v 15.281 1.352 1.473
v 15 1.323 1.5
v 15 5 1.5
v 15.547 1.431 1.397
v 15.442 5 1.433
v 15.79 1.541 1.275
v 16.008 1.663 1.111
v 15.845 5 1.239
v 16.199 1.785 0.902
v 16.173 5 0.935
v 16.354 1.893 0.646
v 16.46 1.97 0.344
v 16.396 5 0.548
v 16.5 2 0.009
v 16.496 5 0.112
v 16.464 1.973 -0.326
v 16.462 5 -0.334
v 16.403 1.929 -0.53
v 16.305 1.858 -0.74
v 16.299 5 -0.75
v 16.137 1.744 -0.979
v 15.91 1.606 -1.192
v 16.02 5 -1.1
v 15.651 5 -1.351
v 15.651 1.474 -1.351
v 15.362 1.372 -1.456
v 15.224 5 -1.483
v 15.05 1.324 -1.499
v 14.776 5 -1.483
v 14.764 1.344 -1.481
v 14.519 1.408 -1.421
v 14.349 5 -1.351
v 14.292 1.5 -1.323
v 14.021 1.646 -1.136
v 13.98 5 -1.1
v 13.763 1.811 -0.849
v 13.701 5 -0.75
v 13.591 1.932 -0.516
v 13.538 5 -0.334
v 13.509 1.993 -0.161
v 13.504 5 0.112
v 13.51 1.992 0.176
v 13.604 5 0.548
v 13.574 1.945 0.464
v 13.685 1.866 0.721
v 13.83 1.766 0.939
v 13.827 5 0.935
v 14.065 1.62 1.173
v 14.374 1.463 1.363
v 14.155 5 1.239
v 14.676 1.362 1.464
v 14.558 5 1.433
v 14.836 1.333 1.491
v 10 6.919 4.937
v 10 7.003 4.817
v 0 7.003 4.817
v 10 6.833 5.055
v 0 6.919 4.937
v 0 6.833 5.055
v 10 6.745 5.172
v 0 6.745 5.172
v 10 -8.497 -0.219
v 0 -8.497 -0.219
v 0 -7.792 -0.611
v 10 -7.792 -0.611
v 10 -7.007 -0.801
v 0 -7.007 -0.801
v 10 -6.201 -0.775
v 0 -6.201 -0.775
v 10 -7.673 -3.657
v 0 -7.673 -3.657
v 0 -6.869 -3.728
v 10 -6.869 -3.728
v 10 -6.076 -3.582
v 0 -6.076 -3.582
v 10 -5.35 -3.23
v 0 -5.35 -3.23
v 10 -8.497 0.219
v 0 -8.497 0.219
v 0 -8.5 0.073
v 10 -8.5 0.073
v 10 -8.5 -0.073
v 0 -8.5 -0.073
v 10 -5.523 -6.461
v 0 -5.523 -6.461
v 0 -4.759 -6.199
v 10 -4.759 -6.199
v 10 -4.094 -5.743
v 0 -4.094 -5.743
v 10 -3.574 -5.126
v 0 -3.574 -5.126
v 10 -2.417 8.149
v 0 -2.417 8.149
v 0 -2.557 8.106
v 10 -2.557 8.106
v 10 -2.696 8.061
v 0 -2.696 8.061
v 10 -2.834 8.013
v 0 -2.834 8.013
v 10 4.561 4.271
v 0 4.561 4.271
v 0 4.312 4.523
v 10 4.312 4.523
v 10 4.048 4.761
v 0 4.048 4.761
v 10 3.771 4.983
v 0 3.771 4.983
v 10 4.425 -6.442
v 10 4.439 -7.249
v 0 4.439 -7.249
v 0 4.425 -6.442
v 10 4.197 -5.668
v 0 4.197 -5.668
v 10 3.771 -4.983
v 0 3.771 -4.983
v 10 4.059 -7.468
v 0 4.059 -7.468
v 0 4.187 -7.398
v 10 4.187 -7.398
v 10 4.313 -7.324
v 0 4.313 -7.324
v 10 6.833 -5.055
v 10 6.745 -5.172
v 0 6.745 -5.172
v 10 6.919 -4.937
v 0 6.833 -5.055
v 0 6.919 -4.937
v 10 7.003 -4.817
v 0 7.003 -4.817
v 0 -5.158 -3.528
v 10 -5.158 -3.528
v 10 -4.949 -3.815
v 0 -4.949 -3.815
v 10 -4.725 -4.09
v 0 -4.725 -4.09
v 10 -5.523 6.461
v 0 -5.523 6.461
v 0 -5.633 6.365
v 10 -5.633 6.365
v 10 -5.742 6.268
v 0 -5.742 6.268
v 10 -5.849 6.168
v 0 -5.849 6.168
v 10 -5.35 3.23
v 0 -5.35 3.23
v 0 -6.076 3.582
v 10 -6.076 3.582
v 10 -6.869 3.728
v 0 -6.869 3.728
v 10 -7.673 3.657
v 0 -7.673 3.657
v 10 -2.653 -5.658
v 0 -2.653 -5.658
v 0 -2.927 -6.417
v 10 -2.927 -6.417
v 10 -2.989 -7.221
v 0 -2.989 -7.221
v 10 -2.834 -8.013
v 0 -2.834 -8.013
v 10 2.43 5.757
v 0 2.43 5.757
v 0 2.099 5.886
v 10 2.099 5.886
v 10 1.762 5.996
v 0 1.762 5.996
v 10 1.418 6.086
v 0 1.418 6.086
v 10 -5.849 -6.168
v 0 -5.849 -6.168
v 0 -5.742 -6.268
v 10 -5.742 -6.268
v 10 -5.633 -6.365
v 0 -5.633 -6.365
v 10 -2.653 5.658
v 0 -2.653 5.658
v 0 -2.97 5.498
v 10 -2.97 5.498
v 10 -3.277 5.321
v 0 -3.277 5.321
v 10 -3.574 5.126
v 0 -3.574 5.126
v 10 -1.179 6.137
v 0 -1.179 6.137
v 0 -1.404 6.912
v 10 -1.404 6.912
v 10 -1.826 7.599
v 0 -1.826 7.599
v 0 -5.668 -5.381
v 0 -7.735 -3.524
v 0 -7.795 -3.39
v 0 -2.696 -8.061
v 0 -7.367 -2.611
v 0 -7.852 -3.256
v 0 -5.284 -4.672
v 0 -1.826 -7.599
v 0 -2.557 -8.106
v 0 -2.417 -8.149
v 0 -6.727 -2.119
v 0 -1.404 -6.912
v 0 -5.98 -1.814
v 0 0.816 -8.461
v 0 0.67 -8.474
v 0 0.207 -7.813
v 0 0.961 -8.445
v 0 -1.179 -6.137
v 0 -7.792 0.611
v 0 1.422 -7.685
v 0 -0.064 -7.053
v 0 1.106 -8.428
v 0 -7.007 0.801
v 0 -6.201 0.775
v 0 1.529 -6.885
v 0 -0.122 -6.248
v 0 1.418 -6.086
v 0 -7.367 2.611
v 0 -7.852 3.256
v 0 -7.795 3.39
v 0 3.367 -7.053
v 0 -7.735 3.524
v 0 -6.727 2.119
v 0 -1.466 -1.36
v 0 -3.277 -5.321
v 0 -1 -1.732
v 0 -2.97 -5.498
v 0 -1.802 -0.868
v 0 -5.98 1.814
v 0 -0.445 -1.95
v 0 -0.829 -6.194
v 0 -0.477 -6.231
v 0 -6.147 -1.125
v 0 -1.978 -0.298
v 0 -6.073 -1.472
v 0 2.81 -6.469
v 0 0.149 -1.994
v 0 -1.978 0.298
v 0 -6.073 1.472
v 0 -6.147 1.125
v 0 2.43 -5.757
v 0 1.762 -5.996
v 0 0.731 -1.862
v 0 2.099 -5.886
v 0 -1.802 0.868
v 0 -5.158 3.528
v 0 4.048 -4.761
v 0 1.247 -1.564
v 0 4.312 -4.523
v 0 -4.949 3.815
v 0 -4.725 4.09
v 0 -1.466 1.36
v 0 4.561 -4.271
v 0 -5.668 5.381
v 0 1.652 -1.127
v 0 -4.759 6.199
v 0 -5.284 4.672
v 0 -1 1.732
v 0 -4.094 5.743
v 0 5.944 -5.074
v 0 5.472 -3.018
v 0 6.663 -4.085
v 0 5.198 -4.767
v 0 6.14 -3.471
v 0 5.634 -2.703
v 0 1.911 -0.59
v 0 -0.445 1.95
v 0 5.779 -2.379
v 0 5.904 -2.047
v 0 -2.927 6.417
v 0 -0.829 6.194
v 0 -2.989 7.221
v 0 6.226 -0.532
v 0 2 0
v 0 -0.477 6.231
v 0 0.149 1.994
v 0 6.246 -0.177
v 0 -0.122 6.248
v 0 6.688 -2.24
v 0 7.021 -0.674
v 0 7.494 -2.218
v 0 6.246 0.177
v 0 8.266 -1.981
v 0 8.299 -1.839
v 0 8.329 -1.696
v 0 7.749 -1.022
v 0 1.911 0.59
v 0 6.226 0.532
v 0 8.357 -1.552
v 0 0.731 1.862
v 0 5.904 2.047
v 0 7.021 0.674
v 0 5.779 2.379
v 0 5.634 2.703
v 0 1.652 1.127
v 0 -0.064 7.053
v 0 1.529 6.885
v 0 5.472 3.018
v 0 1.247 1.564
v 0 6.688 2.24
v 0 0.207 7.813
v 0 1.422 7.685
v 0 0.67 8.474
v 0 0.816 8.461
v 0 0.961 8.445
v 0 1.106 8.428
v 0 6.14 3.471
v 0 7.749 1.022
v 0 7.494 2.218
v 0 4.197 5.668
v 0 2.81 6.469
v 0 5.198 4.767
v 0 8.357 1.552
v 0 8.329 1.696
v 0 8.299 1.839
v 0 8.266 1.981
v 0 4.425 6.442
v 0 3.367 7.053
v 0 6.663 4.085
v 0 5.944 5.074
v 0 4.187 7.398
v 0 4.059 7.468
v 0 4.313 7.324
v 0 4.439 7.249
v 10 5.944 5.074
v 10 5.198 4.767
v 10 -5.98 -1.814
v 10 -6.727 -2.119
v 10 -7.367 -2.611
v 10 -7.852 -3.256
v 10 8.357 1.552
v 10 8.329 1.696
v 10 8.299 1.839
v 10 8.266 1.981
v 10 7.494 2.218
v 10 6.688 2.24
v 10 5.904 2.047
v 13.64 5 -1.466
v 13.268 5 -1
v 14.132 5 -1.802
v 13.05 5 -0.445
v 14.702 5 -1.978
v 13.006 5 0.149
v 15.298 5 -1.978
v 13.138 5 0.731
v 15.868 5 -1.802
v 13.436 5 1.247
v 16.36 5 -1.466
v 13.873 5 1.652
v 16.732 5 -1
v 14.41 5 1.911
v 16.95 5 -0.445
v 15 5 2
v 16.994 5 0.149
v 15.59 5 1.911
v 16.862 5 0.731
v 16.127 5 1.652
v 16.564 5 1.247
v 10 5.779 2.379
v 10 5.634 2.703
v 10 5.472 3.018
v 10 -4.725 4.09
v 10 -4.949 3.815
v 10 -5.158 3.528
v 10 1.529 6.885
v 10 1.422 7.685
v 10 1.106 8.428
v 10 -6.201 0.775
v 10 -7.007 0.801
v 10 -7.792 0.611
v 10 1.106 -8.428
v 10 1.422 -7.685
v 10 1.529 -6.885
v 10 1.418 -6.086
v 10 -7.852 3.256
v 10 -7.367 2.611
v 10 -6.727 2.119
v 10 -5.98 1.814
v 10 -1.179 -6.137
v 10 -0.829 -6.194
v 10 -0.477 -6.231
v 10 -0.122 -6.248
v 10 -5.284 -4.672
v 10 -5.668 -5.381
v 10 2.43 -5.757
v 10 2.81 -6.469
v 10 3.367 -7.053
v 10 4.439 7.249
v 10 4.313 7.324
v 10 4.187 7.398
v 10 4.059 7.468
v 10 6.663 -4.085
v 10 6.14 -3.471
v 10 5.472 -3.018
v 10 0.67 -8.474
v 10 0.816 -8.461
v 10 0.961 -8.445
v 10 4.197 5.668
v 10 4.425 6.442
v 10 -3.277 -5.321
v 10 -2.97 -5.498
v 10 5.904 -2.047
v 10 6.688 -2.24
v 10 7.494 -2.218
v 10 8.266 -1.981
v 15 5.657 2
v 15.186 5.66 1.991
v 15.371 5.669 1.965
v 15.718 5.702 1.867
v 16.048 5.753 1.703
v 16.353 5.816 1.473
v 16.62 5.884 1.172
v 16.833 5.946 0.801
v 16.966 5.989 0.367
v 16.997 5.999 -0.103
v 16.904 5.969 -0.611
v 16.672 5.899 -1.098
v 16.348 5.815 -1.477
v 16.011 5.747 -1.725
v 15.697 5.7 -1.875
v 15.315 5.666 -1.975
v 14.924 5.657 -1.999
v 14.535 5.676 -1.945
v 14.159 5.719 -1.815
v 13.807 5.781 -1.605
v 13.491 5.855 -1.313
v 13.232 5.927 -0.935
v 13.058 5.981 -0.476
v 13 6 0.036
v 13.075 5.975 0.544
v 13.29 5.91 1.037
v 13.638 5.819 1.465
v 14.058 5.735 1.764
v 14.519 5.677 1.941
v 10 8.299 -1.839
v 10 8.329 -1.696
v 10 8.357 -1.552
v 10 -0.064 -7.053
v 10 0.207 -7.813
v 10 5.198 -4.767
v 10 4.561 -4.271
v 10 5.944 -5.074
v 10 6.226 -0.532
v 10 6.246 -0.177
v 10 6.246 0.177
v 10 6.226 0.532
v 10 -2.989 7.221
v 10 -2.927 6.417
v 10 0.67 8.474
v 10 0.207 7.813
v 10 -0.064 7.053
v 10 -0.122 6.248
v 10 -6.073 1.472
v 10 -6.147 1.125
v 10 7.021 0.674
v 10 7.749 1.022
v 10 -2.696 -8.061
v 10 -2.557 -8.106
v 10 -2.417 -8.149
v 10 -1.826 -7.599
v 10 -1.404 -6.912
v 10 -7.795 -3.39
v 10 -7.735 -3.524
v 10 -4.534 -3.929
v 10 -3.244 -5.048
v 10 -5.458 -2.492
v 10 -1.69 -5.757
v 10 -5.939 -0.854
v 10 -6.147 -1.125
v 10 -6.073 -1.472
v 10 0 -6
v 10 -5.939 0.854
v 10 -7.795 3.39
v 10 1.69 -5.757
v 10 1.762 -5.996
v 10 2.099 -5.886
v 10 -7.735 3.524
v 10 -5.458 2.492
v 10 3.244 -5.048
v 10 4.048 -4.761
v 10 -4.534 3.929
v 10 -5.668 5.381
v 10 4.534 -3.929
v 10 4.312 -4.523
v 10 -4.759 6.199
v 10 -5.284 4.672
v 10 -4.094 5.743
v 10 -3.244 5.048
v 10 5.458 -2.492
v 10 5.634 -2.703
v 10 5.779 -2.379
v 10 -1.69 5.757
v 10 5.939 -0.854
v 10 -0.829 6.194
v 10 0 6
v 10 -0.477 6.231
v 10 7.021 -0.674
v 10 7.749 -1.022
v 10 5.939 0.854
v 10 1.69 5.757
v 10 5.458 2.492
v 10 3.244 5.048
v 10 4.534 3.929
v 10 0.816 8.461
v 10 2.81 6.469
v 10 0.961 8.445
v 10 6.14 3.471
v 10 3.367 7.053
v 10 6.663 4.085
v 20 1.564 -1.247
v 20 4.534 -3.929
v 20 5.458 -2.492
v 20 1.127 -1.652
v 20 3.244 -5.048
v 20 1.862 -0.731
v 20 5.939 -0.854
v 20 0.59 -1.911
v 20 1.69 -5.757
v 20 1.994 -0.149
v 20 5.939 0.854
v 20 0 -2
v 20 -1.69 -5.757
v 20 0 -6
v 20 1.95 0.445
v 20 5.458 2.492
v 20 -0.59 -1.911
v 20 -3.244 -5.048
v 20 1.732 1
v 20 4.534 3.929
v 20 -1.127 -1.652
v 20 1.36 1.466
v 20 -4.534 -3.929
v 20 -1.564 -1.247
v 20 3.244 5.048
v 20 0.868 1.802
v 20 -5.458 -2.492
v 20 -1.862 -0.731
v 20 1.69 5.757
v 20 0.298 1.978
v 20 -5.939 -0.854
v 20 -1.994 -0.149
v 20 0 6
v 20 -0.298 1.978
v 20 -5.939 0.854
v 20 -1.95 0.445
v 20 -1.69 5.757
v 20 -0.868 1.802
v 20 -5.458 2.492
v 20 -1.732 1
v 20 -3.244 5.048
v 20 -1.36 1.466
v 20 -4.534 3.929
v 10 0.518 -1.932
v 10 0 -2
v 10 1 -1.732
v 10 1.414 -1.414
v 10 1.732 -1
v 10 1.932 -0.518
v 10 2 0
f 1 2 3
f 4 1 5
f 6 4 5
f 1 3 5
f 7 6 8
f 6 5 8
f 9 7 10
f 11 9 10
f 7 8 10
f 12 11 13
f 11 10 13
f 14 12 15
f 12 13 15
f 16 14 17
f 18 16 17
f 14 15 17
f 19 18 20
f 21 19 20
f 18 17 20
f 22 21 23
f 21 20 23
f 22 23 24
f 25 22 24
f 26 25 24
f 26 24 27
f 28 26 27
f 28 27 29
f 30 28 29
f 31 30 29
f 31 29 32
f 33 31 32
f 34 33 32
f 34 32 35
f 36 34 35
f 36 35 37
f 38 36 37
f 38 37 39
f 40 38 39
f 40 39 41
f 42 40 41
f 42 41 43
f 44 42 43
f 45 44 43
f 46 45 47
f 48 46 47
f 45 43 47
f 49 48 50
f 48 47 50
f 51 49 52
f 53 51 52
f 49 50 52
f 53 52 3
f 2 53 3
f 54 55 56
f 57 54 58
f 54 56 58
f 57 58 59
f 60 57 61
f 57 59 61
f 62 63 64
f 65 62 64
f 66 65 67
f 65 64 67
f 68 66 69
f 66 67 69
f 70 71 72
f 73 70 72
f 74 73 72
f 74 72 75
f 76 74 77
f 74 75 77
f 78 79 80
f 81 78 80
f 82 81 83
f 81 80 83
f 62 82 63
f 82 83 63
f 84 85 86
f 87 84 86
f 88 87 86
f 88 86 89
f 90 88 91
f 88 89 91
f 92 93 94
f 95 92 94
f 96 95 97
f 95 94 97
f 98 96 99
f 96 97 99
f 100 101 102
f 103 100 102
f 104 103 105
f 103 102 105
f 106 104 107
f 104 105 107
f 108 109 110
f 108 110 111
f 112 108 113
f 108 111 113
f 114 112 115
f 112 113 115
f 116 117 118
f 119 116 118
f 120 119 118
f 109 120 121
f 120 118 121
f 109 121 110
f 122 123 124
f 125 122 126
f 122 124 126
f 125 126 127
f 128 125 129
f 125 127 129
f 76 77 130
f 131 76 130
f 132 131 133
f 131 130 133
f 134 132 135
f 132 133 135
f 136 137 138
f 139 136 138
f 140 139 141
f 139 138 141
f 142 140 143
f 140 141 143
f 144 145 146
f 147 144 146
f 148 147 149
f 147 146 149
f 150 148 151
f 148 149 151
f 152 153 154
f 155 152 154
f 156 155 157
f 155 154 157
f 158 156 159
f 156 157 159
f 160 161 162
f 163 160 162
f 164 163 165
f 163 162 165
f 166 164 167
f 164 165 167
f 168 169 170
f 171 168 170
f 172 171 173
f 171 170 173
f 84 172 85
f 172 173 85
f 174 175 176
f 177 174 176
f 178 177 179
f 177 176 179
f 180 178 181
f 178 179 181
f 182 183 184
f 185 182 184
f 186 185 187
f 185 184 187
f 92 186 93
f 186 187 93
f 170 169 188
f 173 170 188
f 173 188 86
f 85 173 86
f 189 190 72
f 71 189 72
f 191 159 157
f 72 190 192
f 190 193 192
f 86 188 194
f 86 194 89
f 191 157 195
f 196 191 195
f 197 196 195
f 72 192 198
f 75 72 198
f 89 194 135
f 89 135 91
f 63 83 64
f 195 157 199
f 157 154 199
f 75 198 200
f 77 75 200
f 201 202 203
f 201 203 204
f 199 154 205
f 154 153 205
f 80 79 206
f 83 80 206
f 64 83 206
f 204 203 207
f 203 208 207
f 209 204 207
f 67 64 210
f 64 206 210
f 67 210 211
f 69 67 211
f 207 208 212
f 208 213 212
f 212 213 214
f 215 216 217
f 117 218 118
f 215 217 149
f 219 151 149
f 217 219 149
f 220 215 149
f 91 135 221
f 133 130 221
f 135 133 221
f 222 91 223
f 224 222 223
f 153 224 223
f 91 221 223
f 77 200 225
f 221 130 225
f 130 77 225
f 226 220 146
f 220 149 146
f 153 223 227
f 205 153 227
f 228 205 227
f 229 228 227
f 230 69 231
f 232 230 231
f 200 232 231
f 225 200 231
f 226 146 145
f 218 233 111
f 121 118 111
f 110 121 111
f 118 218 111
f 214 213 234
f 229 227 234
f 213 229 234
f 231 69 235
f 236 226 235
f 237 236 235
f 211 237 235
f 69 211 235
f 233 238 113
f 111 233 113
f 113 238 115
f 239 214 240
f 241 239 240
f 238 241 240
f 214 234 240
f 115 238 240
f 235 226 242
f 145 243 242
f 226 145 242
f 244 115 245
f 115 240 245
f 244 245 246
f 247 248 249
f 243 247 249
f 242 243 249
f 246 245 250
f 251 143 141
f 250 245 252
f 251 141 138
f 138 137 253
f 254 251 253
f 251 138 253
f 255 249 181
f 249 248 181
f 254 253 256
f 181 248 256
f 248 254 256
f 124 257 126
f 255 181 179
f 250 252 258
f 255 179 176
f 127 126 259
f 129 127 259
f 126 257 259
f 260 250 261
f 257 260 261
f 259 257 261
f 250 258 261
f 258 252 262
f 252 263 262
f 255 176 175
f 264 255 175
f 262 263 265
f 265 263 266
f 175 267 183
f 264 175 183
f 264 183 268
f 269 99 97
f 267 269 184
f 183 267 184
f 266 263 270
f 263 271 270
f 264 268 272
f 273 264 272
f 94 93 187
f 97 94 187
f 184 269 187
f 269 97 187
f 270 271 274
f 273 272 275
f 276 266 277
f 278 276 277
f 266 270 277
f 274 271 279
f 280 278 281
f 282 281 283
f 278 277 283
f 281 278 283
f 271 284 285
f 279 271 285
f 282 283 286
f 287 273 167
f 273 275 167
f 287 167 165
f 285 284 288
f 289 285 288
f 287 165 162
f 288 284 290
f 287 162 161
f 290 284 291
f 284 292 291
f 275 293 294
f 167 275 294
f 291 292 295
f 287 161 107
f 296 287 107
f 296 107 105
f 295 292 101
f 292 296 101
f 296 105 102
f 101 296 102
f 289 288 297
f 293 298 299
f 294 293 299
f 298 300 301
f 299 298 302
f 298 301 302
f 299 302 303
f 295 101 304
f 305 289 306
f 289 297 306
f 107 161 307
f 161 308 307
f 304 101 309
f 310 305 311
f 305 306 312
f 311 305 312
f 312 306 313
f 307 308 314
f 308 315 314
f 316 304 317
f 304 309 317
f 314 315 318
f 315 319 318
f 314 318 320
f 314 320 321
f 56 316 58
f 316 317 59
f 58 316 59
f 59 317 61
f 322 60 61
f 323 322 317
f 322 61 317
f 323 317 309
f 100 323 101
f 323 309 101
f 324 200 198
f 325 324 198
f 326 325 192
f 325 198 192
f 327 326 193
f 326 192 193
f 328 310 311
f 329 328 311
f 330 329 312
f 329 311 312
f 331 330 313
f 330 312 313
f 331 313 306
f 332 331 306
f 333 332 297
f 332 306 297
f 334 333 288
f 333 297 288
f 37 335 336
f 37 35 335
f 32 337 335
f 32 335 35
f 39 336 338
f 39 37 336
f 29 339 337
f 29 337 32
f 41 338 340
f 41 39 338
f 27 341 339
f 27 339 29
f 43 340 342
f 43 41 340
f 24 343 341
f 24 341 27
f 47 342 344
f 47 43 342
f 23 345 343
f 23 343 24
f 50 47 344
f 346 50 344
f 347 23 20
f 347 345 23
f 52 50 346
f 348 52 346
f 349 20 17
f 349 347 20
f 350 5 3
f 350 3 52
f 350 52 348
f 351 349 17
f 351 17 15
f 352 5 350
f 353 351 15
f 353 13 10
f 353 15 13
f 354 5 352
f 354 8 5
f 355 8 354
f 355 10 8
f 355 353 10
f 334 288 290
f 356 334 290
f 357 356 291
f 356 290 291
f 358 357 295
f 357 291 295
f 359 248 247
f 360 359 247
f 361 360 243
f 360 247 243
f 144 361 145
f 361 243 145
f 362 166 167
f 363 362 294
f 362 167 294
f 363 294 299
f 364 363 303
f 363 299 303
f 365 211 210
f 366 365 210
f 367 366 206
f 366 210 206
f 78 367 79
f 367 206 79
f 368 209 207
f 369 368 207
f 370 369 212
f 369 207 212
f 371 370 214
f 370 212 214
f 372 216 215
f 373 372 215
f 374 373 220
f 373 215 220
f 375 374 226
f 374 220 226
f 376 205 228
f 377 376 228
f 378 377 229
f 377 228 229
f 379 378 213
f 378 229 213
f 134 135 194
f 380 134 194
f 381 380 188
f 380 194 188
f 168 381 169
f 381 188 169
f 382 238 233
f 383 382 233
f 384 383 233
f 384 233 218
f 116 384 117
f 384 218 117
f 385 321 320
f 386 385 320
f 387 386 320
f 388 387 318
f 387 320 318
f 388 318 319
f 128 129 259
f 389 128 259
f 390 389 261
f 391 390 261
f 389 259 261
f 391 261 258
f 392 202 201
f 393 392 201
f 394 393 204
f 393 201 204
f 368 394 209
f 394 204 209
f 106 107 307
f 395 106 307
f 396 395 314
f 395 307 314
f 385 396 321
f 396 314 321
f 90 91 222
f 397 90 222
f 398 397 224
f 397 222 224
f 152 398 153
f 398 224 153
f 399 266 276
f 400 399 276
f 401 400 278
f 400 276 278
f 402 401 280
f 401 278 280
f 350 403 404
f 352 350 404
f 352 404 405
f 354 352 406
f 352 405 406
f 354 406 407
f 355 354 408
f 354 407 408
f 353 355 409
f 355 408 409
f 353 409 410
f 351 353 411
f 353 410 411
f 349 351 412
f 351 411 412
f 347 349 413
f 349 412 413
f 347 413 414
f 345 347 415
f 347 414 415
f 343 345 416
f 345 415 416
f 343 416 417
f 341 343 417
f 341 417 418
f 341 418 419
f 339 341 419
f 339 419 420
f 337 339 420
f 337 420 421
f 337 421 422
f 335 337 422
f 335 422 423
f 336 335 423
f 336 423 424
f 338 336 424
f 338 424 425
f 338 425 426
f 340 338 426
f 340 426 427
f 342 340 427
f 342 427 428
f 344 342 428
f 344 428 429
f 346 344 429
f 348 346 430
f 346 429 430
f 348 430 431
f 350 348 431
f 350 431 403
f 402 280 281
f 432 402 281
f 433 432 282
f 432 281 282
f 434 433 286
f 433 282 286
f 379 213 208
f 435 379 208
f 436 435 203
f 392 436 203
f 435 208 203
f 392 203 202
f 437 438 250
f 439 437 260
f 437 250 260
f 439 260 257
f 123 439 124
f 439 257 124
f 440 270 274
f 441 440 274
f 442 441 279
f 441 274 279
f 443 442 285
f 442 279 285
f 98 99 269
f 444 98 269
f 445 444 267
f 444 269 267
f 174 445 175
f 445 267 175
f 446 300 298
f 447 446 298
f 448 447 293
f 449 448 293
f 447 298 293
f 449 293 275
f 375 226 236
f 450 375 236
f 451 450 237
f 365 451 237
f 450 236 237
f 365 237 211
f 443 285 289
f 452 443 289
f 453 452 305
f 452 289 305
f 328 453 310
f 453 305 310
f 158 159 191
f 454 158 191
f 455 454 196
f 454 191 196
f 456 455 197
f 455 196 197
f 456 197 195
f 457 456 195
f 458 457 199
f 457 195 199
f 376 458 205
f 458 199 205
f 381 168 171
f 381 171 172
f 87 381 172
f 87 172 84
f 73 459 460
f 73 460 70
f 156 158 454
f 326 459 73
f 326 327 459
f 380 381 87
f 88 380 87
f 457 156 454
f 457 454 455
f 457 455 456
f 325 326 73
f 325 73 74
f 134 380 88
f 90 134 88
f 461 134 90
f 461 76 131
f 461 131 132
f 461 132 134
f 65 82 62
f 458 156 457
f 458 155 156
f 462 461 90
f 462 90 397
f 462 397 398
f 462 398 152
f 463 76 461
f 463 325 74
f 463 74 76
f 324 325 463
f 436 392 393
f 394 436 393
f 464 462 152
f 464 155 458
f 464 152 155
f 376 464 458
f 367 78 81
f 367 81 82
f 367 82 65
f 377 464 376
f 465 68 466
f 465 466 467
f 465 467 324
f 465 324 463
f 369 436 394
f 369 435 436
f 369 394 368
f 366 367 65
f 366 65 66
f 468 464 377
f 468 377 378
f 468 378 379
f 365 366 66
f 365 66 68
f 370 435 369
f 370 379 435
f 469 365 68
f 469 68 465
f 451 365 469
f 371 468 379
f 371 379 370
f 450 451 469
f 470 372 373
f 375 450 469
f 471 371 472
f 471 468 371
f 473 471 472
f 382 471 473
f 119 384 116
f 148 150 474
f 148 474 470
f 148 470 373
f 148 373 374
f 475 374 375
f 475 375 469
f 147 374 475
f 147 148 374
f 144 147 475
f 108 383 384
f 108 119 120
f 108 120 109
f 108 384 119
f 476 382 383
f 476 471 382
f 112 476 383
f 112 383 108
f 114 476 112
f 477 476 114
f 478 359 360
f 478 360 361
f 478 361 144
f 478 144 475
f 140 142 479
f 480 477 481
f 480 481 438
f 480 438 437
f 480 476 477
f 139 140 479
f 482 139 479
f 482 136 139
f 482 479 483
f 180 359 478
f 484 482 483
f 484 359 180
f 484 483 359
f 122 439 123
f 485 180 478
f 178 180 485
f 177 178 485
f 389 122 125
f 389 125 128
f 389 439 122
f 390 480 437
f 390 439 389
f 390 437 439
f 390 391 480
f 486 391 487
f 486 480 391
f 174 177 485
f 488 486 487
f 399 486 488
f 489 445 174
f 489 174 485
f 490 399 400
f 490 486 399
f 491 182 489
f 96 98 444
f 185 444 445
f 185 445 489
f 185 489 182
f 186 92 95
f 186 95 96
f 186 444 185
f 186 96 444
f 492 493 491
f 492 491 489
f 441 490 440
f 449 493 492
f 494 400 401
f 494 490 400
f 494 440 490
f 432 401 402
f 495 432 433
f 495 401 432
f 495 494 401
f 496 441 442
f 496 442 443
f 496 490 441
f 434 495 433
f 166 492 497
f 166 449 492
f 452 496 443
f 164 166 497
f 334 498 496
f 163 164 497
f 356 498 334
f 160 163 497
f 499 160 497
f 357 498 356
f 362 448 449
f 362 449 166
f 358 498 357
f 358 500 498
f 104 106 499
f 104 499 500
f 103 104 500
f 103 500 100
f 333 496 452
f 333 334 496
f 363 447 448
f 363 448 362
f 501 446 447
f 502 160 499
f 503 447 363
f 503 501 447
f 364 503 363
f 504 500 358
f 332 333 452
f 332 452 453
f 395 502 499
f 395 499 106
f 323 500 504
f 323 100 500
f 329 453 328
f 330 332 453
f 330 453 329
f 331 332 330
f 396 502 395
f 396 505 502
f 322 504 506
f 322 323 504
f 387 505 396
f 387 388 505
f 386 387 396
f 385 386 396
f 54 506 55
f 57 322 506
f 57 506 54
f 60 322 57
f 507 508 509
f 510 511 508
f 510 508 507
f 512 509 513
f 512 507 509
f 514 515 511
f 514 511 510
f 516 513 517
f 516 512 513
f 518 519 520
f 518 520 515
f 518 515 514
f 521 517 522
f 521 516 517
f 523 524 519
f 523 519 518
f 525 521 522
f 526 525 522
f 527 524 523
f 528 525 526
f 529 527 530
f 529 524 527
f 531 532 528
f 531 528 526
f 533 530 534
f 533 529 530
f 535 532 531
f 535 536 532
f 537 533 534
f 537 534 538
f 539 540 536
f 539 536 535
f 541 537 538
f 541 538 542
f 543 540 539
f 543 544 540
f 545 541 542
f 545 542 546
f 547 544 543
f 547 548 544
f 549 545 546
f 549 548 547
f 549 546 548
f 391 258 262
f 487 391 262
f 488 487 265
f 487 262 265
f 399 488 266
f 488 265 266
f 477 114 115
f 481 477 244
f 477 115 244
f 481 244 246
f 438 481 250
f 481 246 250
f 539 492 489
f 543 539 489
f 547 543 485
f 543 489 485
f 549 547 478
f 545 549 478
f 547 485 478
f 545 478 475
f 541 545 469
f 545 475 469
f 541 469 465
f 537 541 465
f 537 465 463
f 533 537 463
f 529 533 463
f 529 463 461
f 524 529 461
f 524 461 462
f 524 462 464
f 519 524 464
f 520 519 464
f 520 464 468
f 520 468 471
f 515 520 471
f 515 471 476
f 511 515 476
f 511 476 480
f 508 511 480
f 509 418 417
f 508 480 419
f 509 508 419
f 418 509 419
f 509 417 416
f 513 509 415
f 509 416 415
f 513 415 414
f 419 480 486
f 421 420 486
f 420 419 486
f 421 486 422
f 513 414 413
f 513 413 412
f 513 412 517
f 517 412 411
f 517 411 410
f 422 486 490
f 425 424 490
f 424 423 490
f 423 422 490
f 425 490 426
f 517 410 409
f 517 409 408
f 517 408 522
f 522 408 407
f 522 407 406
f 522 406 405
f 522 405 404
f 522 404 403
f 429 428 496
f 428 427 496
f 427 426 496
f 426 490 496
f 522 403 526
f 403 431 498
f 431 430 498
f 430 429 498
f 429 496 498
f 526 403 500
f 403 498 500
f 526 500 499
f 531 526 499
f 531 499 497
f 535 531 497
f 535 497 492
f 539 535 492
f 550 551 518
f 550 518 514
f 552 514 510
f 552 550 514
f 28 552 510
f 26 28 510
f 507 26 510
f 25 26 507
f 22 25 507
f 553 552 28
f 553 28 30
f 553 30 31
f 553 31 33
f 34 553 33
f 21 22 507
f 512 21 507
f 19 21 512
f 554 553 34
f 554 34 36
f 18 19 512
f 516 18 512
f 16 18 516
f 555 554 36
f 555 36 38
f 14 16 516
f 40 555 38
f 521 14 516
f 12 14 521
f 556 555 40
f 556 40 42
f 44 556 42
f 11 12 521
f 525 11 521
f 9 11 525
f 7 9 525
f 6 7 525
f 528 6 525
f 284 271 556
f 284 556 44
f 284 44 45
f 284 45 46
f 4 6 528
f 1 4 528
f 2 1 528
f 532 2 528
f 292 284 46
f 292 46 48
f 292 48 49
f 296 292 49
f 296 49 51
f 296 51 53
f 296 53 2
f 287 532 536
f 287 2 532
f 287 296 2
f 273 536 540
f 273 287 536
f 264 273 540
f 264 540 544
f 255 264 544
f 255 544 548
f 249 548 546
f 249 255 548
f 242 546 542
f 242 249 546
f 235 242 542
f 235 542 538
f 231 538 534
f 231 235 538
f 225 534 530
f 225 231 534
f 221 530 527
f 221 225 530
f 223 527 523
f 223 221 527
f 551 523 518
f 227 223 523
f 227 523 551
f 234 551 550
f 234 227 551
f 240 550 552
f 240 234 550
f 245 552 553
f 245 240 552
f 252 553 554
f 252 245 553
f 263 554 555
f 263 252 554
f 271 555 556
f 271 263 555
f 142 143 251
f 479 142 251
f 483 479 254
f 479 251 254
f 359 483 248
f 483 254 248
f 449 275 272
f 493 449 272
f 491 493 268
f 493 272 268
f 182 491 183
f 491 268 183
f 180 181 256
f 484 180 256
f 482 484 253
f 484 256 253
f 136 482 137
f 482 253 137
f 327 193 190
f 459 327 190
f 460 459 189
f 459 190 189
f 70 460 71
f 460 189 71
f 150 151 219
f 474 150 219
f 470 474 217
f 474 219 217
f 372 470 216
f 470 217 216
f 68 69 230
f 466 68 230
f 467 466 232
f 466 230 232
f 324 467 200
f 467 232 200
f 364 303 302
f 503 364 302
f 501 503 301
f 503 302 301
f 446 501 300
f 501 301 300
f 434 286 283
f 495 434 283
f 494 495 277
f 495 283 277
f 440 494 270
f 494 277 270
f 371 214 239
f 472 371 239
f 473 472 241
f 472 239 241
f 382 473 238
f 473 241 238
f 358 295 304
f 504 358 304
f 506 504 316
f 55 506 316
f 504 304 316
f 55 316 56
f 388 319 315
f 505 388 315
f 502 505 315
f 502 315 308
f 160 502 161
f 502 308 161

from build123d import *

# Parameters (mm, degrees)
STOCK_GEAR_1M_15T_D4_START_1_OUTLINE_R = 2
STOCK_GEAR_1M_15T_D4_START_1_DEPTH     = 10
SKETCH1_R                              = 6
SKETCH1_R_2                            = 2
BOSS_EXTRUDE1_DEPTH                    = 10
SKETCH2_R                              = 1.5
CUT_EXTRUDE2_DEPTH                     = 6
SKETCH2_3_R                            = 2
CUT_EXTRUDE3_DEPTH                     = 1


# Read off the part's stored shape, not the designer's step: Stock-Gear 1M 15T D4 Start-1
with BuildPart() as part:
    # Stock-Gear 1M 15T D4 Start-1 outline → Stock-Gear 1M 15T D4 Start-1 (new body)
    with BuildSketch(Plane.YZ):
        with BuildLine():
            ThreePointArc((1.106368468, 8.427689411), (0.888491938, 8.453436111), (0.670023493, 8.473551116))
            ThreePointArc((0.670023493, 8.473551116), (0.04560728, 7.441942771), (-0.122166634, 6.24780572))
            ThreePointArc((-0.122166634, 6.24780572), (-0.653198367, 6.214767324), (-1.179494851, 6.136676046))
            ThreePointArc((-1.179494851, 6.136676046), (-1.591877556, 7.26983618), (-2.417132211, 8.149077977))
            ThreePointArc((-2.417132211, 8.149077977), (-2.626644452, 8.083980389), (-2.834406818, 8.013497238))
            ThreePointArc((-2.834406818, 8.013497238), (-2.985246497, 6.817103167), (-2.652816299, 5.657964889))
            ThreePointArc((-2.652816299, 5.657964889), (-3.1245, 5.411792748), (-3.573533178, 5.126388751))
            ThreePointArc((-3.573533178, 5.126388751), (-4.411161274, 5.993850886), (-5.522688773, 6.461416928))
            ThreePointArc((-5.522688773, 6.461416928), (-5.687610154, 6.316731017), (-5.84874244, 6.167836888))
            ThreePointArc((-5.84874244, 6.167836888), (-5.499924035, 5.013524493), (-4.724769925, 4.089810528))
            ThreePointArc((-4.724769925, 4.089810528), (-5.055547198, 3.673070042), (-5.349675154, 3.229702268))
            ThreePointArc((-5.349675154, 3.229702268), (-6.467715133, 3.681474322), (-7.673322273, 3.656518192))
            ThreePointArc((-7.673322273, 3.656518192), (-7.76513639, 3.457261466), (-7.851777359, 3.255701506))
            ThreePointArc((-7.851777359, 3.255701506), (-7.063614741, 2.343061888), (-5.979767908, 1.814490772))
            ThreePointArc((-5.979767908, 1.814490772), (-6.112444357, 1.299240156), (-6.200809696, 0.774570923))
            ThreePointArc((-6.200809696, 0.774570923), (-7.405942289, 0.732537403), (-8.497168643, 0.219374243))
            ThreePointArc((-8.497168643, 0.219374243), (-8.5, 0), (-8.497168643, -0.219374243))
            ThreePointArc((-8.497168643, -0.219374243), (-7.405942289, -0.732537403), (-6.200809696, -0.774570923))
            ThreePointArc((-6.200809696, -0.774570923), (-6.112444357, -1.299240156), (-5.979767908, -1.814490772))
            ThreePointArc((-5.979767908, -1.814490772), (-7.063614741, -2.343061888), (-7.851777359, -3.255701506))
            ThreePointArc((-7.851777359, -3.255701506), (-7.76513639, -3.457261466), (-7.673322273, -3.656518192))
            ThreePointArc((-7.673322273, -3.656518192), (-6.467715133, -3.681474322), (-5.349675154, -3.229702268))
            ThreePointArc((-5.349675154, -3.229702268), (-5.055547198, -3.673070042), (-4.724769925, -4.089810528))
            ThreePointArc((-4.724769925, -4.089810528), (-5.499924035, -5.013524493), (-5.84874244, -6.167836888))
            ThreePointArc((-5.84874244, -6.167836888), (-5.687610154, -6.316731017), (-5.522688773, -6.461416928))
            ThreePointArc((-5.522688773, -6.461416928), (-4.411161274, -5.993850886), (-3.573533178, -5.126388751))
            ThreePointArc((-3.573533178, -5.126388751), (-3.1245, -5.411792748), (-2.652816299, -5.657964889))
            ThreePointArc((-2.652816299, -5.657964889), (-2.985246497, -6.817103167), (-2.834406818, -8.013497238))
            ThreePointArc((-2.834406818, -8.013497238), (-2.626644452, -8.083980389), (-2.417132211, -8.149077977))
            ThreePointArc((-2.417132211, -8.149077977), (-1.591877556, -7.26983618), (-1.179494851, -6.136676046))
            ThreePointArc((-1.179494851, -6.136676046), (-0.653198367, -6.214767324), (-0.122166634, -6.24780572))
            ThreePointArc((-0.122166634, -6.24780572), (0.04560728, -7.441942771), (0.670023493, -8.473551116))
            ThreePointArc((0.670023493, -8.473551116), (0.888491938, -8.453436111), (1.106368468, -8.427689411))
            ThreePointArc((1.106368468, -8.427689411), (1.502656253, -7.288800753), (1.418488851, -6.085876303))
            ThreePointArc((1.418488851, -6.085876303), (1.931047198, -5.94315217), (2.429606752, -5.757344182))
            ThreePointArc((2.429606752, -5.757344182), (3.068575145, -6.780002862), (4.058600654, -7.468451026))
            ThreePointArc((4.058600654, -7.468451026), (4.25, -7.361215932), (4.438567989, -7.249076783))
            ThreePointArc((4.438567989, -7.249076783), (4.337367144, -6.04746546), (3.771202944, -4.982773259))
            ThreePointArc((3.771202944, -4.982773259), (4.181397159, -4.643912014), (4.561279057, -4.271385532))
            ThreePointArc((4.561279057, -4.271385532), (5.560958489, -4.945738865), (6.745408891, -5.171987905))
            ThreePointArc((6.745408891, -5.171987905), (6.876644452, -4.996174644), (7.003298781, -4.817032924))
            ThreePointArc((7.003298781, -4.817032924), (6.422107853, -3.760468449), (5.471841788, -3.018103451))
            ThreePointArc((5.471841788, -3.018103451), (5.708745565, -2.541697283), (5.904264776, -2.046865518))
            ThreePointArc((5.904264776, -2.046865518), (7.091801591, -2.256311686), (8.265874651, -1.981241089))
            ThreePointArc((8.265874651, -1.981241089), (8.314254606, -1.767249372), (8.357095591, -1.55208031))
            ThreePointArc((8.357095591, -1.55208031), (7.396407771, -0.823252281), (6.226349477, -0.531576138))
            ThreePointArc((6.226349477, -0.531576138), (6.249, 0), (6.226349477, 0.531576138))
            ThreePointArc((6.226349477, 0.531576138), (7.396407771, 0.823252281), (8.357095591, 1.55208031))
            ThreePointArc((8.357095591, 1.55208031), (8.314254606, 1.767249372), (8.265874651, 1.981241089))
            ThreePointArc((8.265874651, 1.981241089), (7.091801591, 2.256311686), (5.904264776, 2.046865518))
            ThreePointArc((5.904264776, 2.046865518), (5.708745565, 2.541697283), (5.471841788, 3.018103451))
            ThreePointArc((5.471841788, 3.018103451), (6.422107853, 3.760468449), (7.003298781, 4.817032924))
            ThreePointArc((7.003298781, 4.817032924), (6.876644452, 4.996174644), (6.745408891, 5.171987905))
            ThreePointArc((6.745408891, 5.171987905), (5.560958489, 4.945738865), (4.561279057, 4.271385532))
            ThreePointArc((4.561279057, 4.271385532), (4.181397159, 4.643912014), (3.771202944, 4.982773259))
            ThreePointArc((3.771202944, 4.982773259), (4.337367144, 6.04746546), (4.438567989, 7.249076783))
            ThreePointArc((4.438567989, 7.249076783), (4.25, 7.361215932), (4.058600654, 7.468451026))
            ThreePointArc((4.058600654, 7.468451026), (3.068575145, 6.780002862), (2.429606752, 5.757344182))
            ThreePointArc((2.429606752, 5.757344182), (1.931047198, 5.94315217), (1.418488851, 6.085876303))
            ThreePointArc((1.418488851, 6.085876303), (1.502656253, 7.288800753), (1.106368468, 8.427689411))
        make_face()
        Circle(STOCK_GEAR_1M_15T_D4_START_1_OUTLINE_R, mode=Mode.SUBTRACT)
    extrude(amount=STOCK_GEAR_1M_15T_D4_START_1_DEPTH)

    # Sketch1 → Boss-Extrude1 (add)
    with BuildSketch(Plane(origin=(10, 0, 0), x_dir=(0, 0, -1), z_dir=(1, 0, 0))):
        with Locations(Location((0, 0, 0), (0, 0, 180))):
            Circle(SKETCH1_R)
        Circle(SKETCH1_R_2, mode=Mode.SUBTRACT)
    extrude(amount=BOSS_EXTRUDE1_DEPTH)

    # Sketch2 → Cut-Extrude2 (cut)
    with BuildSketch(Plane(origin=(0, 6, 0), x_dir=(1, 0, 0), z_dir=(0, 1, 0))):
        with Locations(Location((15, 0, 0), (0, 0, 270))):
            Circle(SKETCH2_R)
    extrude(amount=-CUT_EXTRUDE2_DEPTH, mode=Mode.SUBTRACT)

    # Sketch2<3> → Cut-Extrude3 (cut)
    with BuildSketch(Plane(origin=(0, 6, 0), x_dir=(1, 0, 0), z_dir=(0, 1, 0))):
        with Locations(Location((15, 0, 0), (0, 0, 270))):
            Circle(SKETCH2_3_R)
    extrude(amount=-CUT_EXTRUDE3_DEPTH, mode=Mode.SUBTRACT)


solid = part.part
